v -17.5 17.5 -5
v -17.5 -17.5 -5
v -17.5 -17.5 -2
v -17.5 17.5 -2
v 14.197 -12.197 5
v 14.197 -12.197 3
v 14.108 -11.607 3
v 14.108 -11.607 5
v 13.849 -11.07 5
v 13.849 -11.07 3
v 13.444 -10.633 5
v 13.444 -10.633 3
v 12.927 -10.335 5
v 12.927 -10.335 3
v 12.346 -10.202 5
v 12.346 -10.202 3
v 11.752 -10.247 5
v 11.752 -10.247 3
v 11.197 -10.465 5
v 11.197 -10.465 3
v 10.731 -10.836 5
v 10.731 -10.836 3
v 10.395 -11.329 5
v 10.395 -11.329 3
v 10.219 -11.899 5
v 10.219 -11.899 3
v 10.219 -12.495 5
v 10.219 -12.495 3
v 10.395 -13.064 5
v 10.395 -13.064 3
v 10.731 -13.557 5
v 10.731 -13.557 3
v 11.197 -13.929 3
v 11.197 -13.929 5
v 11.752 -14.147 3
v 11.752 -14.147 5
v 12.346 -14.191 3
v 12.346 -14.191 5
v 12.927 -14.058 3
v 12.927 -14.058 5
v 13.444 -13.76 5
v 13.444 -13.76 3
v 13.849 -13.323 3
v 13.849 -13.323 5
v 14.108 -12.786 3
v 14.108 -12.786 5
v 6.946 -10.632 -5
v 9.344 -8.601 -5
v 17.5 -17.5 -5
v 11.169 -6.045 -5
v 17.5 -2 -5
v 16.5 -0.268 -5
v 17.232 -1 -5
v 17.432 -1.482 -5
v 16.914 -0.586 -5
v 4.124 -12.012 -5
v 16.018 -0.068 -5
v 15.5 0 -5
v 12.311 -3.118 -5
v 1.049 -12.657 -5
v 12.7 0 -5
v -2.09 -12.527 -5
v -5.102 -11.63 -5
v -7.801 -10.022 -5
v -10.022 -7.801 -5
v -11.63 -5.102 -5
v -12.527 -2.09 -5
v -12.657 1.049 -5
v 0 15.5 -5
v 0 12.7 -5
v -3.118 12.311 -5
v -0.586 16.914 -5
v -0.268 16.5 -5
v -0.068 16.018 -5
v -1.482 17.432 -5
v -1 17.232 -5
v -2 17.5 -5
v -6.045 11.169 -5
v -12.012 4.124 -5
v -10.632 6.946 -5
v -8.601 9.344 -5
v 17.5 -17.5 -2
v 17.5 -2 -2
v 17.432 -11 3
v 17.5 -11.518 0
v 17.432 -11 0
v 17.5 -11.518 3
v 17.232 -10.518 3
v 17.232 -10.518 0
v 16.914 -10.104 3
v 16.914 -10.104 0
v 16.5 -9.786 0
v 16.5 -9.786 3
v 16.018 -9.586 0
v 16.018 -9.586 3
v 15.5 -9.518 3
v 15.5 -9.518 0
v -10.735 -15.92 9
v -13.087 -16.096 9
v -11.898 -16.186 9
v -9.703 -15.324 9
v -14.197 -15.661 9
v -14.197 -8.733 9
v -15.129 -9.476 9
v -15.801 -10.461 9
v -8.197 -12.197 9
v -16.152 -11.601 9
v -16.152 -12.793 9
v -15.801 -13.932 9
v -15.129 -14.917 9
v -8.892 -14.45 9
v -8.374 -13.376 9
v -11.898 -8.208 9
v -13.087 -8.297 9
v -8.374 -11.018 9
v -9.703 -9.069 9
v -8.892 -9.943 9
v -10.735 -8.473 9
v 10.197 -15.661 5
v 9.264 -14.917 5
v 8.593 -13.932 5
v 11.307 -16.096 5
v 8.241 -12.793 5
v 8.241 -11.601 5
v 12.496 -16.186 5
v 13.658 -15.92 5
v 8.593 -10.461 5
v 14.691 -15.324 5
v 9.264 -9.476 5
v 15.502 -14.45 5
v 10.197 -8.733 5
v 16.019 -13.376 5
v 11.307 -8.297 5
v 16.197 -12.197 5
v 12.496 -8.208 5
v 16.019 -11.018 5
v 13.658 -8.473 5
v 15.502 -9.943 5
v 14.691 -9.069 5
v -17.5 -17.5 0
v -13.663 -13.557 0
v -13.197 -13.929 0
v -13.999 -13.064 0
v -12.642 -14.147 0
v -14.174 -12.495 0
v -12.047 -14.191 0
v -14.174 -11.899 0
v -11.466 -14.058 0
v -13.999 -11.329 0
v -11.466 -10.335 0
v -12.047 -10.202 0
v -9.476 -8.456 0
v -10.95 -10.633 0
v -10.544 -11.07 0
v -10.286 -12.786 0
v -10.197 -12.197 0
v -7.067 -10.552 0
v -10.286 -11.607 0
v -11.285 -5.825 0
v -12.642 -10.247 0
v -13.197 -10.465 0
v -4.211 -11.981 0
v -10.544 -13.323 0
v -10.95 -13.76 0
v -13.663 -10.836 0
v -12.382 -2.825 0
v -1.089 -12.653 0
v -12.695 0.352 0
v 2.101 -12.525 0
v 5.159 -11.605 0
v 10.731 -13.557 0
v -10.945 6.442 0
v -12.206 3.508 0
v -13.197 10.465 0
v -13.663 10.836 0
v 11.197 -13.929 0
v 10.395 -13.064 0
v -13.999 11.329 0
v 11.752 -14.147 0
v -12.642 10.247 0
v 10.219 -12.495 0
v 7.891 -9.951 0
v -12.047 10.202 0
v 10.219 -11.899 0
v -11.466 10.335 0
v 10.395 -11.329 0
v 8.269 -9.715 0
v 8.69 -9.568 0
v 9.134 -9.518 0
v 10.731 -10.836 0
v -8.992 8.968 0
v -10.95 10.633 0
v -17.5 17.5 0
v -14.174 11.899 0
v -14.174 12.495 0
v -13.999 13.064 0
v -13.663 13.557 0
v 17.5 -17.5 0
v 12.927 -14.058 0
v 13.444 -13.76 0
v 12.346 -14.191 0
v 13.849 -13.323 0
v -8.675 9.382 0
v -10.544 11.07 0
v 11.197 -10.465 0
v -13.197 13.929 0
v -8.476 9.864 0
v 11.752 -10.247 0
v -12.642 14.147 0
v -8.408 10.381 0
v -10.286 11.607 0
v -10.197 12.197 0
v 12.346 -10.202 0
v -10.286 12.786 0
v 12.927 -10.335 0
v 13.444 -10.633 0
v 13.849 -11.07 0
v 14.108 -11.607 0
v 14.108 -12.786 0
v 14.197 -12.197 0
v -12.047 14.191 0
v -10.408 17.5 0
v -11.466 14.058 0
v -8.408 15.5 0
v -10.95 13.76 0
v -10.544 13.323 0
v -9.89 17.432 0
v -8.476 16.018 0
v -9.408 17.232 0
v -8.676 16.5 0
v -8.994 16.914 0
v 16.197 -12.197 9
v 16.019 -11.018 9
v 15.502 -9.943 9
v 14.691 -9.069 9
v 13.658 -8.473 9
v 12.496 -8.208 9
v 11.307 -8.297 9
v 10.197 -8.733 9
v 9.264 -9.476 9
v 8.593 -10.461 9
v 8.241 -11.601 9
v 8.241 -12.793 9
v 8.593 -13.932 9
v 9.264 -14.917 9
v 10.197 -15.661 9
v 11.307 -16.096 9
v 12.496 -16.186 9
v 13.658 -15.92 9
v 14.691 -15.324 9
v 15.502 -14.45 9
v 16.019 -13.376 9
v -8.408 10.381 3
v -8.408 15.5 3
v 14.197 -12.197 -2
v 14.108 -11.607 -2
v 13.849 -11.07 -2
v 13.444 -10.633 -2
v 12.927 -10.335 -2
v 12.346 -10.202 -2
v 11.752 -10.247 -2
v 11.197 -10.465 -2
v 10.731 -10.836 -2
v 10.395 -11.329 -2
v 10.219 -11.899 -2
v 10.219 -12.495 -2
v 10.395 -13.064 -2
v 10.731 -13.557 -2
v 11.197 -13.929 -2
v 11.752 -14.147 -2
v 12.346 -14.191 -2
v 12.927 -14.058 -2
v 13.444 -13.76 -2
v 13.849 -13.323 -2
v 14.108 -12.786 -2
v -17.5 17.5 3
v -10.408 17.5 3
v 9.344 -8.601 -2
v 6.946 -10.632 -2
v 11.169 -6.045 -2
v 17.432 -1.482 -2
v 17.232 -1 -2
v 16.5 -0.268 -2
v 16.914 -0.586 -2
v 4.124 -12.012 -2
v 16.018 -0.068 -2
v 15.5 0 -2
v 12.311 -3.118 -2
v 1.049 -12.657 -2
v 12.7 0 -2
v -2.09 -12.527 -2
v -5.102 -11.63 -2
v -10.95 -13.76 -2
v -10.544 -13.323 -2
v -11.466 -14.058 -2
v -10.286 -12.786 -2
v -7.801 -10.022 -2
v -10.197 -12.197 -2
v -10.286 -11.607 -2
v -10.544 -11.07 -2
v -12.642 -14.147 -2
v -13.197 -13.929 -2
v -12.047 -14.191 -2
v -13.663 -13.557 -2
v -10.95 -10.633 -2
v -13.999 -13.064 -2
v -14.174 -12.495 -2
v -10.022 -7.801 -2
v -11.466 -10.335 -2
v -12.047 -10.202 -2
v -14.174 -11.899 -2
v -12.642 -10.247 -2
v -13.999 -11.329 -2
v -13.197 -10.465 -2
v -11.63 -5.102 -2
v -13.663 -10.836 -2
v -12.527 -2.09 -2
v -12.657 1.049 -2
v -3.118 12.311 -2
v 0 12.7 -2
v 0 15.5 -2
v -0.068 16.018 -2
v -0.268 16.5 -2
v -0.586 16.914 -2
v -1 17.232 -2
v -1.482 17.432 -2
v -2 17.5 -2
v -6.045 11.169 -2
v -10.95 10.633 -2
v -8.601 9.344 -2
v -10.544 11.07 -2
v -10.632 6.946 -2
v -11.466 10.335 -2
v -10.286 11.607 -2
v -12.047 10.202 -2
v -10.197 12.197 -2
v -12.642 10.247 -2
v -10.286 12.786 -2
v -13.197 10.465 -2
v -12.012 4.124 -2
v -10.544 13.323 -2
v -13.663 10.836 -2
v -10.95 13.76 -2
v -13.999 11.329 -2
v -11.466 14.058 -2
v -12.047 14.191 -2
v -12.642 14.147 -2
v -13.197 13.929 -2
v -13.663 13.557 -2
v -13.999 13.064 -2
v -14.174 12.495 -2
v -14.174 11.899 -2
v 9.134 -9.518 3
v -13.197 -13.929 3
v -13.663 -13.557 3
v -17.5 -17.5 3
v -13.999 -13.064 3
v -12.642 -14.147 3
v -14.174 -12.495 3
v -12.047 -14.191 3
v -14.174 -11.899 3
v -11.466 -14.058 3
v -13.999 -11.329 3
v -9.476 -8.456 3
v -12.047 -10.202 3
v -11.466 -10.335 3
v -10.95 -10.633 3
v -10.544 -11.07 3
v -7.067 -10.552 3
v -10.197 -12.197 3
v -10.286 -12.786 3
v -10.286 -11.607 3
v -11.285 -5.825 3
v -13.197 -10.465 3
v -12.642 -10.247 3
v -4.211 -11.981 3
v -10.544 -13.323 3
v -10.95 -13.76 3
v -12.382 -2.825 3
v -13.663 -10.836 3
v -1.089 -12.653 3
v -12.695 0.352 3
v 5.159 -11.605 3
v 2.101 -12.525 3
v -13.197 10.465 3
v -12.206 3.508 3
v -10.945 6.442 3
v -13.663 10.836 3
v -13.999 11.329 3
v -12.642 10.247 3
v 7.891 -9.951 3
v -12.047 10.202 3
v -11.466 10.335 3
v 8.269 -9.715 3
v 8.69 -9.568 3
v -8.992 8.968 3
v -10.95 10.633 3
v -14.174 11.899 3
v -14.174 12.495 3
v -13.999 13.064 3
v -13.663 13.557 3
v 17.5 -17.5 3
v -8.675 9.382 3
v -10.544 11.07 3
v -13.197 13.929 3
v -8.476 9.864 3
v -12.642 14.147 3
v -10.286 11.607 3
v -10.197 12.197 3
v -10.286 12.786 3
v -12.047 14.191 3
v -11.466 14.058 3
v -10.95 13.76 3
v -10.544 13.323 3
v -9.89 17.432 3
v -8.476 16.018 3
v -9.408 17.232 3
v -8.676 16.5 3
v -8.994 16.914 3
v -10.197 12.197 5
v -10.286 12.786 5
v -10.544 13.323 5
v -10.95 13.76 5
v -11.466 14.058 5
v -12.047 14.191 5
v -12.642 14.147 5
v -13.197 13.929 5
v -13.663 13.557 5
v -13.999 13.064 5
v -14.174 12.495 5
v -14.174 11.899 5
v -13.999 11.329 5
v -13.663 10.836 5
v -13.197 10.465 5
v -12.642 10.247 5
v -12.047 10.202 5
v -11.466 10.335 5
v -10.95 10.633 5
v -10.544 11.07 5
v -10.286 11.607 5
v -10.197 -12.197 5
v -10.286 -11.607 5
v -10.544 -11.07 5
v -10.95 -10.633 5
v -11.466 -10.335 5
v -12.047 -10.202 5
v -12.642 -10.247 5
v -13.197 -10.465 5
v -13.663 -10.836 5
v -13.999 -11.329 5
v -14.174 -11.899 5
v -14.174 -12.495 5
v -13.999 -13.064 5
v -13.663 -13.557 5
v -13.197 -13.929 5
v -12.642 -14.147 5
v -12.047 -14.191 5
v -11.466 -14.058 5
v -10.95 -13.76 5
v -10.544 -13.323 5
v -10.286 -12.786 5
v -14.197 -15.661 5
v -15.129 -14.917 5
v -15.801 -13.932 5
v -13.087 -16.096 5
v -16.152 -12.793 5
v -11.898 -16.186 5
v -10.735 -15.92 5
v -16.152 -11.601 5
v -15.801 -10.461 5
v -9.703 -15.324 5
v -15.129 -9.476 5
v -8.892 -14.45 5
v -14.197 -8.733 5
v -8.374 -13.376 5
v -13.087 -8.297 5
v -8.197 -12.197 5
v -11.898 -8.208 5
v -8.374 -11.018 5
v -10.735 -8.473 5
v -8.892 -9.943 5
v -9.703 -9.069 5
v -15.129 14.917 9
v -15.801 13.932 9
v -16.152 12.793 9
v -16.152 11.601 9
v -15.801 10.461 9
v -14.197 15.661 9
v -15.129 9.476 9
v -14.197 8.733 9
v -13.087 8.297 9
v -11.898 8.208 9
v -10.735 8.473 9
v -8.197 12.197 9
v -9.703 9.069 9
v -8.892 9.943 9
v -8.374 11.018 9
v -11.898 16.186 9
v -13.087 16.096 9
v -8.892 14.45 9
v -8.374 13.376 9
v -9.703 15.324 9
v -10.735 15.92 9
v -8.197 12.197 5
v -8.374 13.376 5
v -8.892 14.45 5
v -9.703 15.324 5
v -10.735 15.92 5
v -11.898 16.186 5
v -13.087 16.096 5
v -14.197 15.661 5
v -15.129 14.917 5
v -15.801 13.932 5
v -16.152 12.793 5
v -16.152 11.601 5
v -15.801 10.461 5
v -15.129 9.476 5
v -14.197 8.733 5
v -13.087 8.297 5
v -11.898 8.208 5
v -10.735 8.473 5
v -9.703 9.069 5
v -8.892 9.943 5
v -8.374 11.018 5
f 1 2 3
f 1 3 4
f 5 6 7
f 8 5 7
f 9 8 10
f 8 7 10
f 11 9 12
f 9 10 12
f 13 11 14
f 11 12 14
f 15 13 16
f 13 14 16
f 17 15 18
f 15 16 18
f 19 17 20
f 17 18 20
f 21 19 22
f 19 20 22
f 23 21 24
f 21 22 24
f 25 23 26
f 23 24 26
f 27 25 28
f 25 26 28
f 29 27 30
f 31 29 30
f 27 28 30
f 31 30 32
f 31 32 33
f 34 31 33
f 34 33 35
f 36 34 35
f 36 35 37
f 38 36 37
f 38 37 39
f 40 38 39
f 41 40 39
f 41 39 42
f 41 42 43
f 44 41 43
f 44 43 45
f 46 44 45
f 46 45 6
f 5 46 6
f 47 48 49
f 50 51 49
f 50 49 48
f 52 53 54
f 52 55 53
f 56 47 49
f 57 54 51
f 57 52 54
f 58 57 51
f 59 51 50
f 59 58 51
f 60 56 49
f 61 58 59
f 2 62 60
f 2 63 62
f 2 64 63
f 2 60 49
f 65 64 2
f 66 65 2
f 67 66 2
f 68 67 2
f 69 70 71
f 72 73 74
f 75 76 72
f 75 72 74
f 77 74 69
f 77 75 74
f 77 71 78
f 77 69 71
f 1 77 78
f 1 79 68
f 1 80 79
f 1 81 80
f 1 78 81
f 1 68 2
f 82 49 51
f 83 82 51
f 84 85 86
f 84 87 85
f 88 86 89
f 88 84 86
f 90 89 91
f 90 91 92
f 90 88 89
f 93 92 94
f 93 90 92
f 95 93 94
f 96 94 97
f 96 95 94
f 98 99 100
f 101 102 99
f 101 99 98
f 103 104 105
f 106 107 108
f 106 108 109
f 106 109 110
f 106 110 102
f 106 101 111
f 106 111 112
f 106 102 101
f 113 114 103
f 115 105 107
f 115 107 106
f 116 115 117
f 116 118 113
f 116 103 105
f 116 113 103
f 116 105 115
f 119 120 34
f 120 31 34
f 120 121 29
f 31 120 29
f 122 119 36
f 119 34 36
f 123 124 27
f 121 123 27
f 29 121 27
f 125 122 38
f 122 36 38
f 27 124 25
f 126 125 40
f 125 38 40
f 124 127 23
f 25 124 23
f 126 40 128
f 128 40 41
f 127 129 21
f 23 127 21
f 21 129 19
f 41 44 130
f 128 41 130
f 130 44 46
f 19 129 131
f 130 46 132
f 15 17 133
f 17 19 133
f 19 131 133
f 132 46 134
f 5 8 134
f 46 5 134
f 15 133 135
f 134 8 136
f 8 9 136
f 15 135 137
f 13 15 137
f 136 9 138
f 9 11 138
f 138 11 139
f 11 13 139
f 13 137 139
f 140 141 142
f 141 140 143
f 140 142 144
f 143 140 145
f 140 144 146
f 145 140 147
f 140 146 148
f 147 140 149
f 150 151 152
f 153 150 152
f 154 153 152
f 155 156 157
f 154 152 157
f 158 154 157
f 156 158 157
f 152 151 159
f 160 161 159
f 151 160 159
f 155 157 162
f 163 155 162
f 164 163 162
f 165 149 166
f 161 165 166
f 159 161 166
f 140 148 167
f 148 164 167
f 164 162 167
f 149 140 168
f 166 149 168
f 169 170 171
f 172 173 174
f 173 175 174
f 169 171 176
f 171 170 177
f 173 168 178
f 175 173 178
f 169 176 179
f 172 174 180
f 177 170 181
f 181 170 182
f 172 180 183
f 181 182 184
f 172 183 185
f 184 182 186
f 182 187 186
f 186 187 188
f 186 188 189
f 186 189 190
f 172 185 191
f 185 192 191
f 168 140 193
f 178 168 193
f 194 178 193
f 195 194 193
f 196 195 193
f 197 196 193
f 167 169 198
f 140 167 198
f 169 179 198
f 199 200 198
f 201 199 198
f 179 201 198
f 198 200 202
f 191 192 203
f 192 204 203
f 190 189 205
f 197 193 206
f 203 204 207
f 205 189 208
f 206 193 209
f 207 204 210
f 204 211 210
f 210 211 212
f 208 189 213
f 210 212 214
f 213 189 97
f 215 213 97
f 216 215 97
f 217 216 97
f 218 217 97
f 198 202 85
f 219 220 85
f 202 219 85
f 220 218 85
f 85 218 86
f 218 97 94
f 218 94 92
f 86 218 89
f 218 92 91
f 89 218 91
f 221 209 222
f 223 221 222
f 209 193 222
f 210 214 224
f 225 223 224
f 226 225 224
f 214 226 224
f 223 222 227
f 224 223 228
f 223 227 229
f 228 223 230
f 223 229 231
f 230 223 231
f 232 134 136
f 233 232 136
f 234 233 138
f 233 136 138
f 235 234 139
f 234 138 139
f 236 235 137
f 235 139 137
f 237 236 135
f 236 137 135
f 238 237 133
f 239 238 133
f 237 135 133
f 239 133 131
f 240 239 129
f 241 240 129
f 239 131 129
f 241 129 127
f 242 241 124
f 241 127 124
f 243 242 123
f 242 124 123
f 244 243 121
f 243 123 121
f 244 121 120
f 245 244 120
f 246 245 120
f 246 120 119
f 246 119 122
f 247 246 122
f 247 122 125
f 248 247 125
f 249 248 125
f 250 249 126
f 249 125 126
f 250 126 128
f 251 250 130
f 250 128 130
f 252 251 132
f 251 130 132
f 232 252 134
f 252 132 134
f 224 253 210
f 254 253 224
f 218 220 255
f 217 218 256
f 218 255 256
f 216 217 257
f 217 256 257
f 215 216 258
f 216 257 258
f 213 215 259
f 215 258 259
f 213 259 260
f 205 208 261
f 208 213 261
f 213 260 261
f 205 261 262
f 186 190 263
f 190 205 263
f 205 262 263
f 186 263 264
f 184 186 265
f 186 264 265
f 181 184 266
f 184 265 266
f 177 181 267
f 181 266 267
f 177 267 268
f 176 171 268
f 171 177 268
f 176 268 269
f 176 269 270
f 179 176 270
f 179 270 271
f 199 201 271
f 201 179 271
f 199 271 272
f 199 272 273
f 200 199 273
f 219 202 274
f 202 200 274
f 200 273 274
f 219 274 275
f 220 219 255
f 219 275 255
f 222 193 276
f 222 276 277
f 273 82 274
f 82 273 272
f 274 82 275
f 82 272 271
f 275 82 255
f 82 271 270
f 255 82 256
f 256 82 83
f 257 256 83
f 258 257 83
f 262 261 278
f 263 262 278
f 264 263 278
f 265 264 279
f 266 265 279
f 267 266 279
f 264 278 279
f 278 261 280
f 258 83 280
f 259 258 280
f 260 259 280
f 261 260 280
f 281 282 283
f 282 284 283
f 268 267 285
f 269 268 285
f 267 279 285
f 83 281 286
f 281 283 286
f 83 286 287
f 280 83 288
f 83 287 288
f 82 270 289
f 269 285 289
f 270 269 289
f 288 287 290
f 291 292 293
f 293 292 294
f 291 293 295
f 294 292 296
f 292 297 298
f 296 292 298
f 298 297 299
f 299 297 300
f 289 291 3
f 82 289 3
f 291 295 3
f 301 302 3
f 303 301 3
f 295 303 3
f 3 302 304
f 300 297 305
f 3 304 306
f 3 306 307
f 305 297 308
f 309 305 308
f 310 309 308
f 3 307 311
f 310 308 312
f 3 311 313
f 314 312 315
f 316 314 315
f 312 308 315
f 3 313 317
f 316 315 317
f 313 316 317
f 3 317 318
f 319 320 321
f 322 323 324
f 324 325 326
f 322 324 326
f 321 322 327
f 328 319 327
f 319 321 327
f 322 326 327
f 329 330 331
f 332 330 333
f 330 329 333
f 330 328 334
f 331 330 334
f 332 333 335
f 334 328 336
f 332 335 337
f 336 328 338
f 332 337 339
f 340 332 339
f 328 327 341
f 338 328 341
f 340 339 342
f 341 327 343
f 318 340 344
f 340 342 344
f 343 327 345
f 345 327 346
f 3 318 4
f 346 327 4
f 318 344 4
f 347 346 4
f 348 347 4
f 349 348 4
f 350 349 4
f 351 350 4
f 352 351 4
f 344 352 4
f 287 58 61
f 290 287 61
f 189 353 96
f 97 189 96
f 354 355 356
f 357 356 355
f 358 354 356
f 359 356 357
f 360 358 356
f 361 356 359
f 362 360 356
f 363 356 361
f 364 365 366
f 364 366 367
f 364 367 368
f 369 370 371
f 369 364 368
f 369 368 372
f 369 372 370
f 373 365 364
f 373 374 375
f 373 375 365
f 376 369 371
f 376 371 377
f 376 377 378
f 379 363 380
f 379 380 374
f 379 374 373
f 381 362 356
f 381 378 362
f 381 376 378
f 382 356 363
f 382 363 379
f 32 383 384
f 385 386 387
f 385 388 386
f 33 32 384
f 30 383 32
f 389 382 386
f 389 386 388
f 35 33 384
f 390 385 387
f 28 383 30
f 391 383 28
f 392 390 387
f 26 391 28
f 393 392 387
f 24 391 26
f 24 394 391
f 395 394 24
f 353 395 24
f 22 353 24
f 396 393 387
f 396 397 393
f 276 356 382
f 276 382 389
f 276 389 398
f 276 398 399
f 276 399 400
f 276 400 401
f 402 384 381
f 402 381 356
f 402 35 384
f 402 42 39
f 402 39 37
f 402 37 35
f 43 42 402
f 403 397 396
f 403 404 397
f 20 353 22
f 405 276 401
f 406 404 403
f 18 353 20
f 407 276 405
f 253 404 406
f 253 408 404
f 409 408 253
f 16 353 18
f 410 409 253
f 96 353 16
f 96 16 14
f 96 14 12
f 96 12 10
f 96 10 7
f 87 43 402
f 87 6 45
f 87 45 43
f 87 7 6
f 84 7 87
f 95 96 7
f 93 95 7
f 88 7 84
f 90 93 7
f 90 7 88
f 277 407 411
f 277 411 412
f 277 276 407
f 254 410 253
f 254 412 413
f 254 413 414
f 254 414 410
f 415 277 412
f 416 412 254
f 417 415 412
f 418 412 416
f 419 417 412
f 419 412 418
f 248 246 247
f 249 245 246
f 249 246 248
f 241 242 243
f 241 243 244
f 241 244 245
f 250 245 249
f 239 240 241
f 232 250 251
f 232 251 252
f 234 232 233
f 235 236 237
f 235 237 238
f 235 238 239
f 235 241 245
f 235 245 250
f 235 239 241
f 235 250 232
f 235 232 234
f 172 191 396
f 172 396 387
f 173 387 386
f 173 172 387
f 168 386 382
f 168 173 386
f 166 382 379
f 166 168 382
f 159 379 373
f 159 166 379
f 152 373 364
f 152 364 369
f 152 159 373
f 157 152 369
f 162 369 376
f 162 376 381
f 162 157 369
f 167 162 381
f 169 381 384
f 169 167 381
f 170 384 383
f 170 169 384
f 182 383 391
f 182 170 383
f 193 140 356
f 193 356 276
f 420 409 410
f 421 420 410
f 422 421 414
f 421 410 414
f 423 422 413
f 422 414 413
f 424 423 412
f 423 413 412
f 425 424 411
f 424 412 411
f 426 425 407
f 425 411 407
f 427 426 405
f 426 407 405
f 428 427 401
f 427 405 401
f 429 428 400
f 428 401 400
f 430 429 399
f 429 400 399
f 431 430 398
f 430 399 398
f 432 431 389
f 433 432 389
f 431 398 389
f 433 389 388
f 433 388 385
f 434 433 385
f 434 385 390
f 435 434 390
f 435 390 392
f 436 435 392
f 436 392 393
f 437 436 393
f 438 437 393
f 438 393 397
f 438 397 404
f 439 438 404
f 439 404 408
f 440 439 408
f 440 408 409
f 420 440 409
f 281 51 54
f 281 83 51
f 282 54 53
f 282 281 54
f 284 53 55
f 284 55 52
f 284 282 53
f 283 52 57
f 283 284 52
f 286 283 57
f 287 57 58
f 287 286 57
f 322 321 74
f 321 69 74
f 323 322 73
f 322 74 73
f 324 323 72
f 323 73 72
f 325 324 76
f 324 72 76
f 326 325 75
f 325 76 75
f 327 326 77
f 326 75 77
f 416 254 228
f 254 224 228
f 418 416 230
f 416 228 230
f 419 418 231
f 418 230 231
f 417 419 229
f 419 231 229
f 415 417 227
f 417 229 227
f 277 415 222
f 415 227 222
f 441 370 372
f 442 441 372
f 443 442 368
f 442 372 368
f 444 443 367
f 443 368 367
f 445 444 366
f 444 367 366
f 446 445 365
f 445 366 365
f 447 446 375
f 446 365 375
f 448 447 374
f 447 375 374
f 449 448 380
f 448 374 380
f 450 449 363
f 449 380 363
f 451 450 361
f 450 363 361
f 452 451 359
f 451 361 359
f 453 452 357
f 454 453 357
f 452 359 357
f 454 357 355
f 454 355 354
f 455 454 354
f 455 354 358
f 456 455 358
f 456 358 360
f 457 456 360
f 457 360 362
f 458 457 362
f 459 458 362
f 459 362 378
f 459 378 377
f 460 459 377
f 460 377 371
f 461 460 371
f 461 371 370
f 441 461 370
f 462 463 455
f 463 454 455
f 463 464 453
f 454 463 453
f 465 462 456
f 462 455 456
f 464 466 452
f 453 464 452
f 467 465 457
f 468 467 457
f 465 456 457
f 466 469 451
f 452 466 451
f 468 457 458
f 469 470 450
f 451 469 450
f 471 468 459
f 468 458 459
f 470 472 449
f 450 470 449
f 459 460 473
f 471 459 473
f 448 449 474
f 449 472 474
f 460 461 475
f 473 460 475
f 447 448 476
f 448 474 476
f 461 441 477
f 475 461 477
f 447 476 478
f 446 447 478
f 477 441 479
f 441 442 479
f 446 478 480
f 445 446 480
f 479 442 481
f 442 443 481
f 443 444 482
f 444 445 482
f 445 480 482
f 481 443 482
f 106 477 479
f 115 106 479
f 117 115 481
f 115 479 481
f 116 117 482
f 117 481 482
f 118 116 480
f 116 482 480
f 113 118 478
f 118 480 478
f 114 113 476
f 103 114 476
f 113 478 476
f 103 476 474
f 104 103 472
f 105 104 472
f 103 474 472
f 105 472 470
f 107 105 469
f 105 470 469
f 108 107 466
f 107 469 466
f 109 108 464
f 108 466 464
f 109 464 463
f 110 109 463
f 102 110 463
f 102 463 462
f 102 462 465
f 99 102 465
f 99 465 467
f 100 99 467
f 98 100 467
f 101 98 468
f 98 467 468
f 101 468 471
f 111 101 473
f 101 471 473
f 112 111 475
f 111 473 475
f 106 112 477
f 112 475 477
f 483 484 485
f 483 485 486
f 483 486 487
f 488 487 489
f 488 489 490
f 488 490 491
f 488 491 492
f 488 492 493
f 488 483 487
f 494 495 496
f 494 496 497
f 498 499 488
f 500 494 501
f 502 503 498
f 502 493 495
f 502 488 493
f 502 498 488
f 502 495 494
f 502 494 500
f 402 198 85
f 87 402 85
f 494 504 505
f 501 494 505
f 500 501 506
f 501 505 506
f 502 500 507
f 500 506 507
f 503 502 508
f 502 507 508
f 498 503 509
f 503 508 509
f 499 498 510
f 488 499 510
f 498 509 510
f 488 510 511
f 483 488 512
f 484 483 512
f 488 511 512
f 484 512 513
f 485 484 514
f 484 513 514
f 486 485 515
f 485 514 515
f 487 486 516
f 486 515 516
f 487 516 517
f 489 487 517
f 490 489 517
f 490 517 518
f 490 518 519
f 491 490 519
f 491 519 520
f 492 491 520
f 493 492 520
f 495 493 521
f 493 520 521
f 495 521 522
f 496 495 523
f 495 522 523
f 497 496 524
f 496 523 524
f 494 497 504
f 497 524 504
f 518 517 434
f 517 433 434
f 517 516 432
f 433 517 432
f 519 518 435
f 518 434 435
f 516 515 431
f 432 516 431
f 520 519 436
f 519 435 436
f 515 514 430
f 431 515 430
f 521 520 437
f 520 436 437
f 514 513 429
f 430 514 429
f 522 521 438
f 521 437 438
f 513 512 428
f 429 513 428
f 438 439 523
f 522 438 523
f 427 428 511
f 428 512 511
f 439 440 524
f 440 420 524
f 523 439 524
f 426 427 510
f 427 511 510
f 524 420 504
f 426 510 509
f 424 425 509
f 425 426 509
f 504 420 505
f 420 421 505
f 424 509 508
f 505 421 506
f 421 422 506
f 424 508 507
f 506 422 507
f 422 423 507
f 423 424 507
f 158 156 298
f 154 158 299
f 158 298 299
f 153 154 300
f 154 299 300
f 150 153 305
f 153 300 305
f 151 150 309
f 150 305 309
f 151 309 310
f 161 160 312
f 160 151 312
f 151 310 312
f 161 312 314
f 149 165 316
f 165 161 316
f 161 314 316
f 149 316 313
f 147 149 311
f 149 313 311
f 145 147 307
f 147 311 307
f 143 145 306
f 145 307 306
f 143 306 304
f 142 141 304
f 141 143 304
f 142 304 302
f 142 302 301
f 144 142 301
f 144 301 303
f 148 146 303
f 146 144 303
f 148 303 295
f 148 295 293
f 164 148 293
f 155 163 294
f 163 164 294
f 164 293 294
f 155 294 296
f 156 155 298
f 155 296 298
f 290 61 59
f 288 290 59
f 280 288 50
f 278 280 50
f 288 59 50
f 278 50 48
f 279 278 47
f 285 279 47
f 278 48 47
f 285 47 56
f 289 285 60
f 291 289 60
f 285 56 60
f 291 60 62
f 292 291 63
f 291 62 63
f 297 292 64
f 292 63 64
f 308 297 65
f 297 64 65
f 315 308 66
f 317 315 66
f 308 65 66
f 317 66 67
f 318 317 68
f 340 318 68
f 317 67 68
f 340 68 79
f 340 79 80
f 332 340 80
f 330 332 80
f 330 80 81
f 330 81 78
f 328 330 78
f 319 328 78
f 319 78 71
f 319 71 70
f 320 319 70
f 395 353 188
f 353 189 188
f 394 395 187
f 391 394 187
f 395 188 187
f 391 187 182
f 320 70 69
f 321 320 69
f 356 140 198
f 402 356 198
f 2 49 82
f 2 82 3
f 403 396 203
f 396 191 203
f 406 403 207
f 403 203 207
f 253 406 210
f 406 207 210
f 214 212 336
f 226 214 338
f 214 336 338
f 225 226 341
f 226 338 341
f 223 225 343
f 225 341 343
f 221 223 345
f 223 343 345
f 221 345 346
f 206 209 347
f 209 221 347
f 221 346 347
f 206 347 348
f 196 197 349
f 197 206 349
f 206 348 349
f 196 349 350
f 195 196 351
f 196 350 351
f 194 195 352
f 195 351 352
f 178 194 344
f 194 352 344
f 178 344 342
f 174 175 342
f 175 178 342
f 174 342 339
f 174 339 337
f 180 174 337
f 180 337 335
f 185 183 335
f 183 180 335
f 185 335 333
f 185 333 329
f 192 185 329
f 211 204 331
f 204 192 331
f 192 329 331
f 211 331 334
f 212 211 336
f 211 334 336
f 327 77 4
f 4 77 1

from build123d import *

# Parameters (mm, degrees)
SKETCH_1_W           = 35
SKETCH_1_H           = 35
SKETCH_1_R           = 12.7
EXTRUDE_1_DEPTH      = 3
EXTRUDE_2_DEPTH      = 2
EXTRUDE_2_DEPTH_BACK = 5
SKETCH_2_R           = 2
SKETCH_3_R           = 4
EXTRUDE_3_DEPTH      = 4
EXTRUDE_START        = 3
SKETCH_4_W           = 35
SKETCH_4_H           = 35
SKETCH_4_R           = 12.7
EXTRUDE_4_DEPTH      = 3
SKETCH_5_W           = 51.816122842
SKETCH_5_H           = 54.036228948
CUT_EXTRUDE_1_DEPTH  = 3
SKETCH_7_W           = 35
SKETCH_7_H           = 35
CUT_EXTRUDE_3_DEPTH  = 3
FILLET_1_R           = 2


with BuildPart() as part:
    # 草图1 → 凸台-拉伸1 (new body)
    with BuildSketch(Plane.XY):
        Rectangle(SKETCH_1_W, SKETCH_1_H)
        Circle(SKETCH_1_R, mode=Mode.SUBTRACT)
    extrude(amount=EXTRUDE_1_DEPTH)

    # 草图2 → 凸台-拉伸2 (add, two sides: drawn at the far end of the back side and taken through both)
    with BuildSketch(Plane.XY.offset(3).offset(-EXTRUDE_2_DEPTH_BACK)):
        with Locations((-12.196699141, 12.196699141)):
            Circle(SKETCH_2_R)
        with Locations((12.196699141, -12.196699141)):
            Circle(SKETCH_2_R)
        with Locations((-12.196699141, -12.196699141)):
            Circle(SKETCH_2_R)
    extrude(amount=EXTRUDE_2_DEPTH + EXTRUDE_2_DEPTH_BACK)

    # 草图3 → 凸台-拉伸3 (add)
    with BuildSketch(Plane.XY.offset(5)):
        with Locations((-12.196699141, 12.196699141)):
            Circle(SKETCH_3_R)
        with Locations((-12.196699141, -12.196699141)):
            Circle(SKETCH_3_R)
        with Locations((12.196699141, -12.196699141)):
            Circle(SKETCH_3_R)
    extrude(amount=EXTRUDE_3_DEPTH)

    # 草图4 → 凸台-拉伸4 (add)
    with BuildSketch(Plane(origin=(0, 0, -2), x_dir=(-1, 0, 0), z_dir=(0, 0, -1)).offset(EXTRUDE_START)):
        Rectangle(SKETCH_4_W, SKETCH_4_H)
        with Locations(Location((0, 0, 0), (0, 0, 180))):
            Circle(SKETCH_4_R, mode=Mode.SUBTRACT)
    extrude(amount=-EXTRUDE_4_DEPTH)

    # 草图5 → 切除-拉伸1 (cut)
    with BuildSketch(Plane.XY.offset(3)):
        with Locations((17.5, 17.5)):
            Rectangle(SKETCH_5_W, SKETCH_5_H)
    extrude(amount=-CUT_EXTRUDE_1_DEPTH, mode=Mode.SUBTRACT)

    # 草图7 → 切除-拉伸3 (cut)
    with BuildSketch(Plane(origin=(0, 0, -5), x_dir=(-1, 0, 0), z_dir=(0, 0, -1))):
        with Locations((-17.5, 17.5)):
            Rectangle(SKETCH_7_W, SKETCH_7_H)
    extrude(amount=-CUT_EXTRUDE_3_DEPTH, mode=Mode.SUBTRACT)

    # 圆角1
    fillet_1_edges = [part.edges().sort_by_distance(p)[0] for p in [
        (8.408061421, -9.518114474, 1.5),
        (-8.408061421, 9.518114474, 1.5),
        (-8.408061421, 17.5, 1.5),
        (17.5, -9.518114474, 1.5),
        (0, 17.5, -3.5),
        (17.5, 0, -3.5),
    ]]
    fillet(fillet_1_edges, radius=FILLET_1_R)


solid = part.part
